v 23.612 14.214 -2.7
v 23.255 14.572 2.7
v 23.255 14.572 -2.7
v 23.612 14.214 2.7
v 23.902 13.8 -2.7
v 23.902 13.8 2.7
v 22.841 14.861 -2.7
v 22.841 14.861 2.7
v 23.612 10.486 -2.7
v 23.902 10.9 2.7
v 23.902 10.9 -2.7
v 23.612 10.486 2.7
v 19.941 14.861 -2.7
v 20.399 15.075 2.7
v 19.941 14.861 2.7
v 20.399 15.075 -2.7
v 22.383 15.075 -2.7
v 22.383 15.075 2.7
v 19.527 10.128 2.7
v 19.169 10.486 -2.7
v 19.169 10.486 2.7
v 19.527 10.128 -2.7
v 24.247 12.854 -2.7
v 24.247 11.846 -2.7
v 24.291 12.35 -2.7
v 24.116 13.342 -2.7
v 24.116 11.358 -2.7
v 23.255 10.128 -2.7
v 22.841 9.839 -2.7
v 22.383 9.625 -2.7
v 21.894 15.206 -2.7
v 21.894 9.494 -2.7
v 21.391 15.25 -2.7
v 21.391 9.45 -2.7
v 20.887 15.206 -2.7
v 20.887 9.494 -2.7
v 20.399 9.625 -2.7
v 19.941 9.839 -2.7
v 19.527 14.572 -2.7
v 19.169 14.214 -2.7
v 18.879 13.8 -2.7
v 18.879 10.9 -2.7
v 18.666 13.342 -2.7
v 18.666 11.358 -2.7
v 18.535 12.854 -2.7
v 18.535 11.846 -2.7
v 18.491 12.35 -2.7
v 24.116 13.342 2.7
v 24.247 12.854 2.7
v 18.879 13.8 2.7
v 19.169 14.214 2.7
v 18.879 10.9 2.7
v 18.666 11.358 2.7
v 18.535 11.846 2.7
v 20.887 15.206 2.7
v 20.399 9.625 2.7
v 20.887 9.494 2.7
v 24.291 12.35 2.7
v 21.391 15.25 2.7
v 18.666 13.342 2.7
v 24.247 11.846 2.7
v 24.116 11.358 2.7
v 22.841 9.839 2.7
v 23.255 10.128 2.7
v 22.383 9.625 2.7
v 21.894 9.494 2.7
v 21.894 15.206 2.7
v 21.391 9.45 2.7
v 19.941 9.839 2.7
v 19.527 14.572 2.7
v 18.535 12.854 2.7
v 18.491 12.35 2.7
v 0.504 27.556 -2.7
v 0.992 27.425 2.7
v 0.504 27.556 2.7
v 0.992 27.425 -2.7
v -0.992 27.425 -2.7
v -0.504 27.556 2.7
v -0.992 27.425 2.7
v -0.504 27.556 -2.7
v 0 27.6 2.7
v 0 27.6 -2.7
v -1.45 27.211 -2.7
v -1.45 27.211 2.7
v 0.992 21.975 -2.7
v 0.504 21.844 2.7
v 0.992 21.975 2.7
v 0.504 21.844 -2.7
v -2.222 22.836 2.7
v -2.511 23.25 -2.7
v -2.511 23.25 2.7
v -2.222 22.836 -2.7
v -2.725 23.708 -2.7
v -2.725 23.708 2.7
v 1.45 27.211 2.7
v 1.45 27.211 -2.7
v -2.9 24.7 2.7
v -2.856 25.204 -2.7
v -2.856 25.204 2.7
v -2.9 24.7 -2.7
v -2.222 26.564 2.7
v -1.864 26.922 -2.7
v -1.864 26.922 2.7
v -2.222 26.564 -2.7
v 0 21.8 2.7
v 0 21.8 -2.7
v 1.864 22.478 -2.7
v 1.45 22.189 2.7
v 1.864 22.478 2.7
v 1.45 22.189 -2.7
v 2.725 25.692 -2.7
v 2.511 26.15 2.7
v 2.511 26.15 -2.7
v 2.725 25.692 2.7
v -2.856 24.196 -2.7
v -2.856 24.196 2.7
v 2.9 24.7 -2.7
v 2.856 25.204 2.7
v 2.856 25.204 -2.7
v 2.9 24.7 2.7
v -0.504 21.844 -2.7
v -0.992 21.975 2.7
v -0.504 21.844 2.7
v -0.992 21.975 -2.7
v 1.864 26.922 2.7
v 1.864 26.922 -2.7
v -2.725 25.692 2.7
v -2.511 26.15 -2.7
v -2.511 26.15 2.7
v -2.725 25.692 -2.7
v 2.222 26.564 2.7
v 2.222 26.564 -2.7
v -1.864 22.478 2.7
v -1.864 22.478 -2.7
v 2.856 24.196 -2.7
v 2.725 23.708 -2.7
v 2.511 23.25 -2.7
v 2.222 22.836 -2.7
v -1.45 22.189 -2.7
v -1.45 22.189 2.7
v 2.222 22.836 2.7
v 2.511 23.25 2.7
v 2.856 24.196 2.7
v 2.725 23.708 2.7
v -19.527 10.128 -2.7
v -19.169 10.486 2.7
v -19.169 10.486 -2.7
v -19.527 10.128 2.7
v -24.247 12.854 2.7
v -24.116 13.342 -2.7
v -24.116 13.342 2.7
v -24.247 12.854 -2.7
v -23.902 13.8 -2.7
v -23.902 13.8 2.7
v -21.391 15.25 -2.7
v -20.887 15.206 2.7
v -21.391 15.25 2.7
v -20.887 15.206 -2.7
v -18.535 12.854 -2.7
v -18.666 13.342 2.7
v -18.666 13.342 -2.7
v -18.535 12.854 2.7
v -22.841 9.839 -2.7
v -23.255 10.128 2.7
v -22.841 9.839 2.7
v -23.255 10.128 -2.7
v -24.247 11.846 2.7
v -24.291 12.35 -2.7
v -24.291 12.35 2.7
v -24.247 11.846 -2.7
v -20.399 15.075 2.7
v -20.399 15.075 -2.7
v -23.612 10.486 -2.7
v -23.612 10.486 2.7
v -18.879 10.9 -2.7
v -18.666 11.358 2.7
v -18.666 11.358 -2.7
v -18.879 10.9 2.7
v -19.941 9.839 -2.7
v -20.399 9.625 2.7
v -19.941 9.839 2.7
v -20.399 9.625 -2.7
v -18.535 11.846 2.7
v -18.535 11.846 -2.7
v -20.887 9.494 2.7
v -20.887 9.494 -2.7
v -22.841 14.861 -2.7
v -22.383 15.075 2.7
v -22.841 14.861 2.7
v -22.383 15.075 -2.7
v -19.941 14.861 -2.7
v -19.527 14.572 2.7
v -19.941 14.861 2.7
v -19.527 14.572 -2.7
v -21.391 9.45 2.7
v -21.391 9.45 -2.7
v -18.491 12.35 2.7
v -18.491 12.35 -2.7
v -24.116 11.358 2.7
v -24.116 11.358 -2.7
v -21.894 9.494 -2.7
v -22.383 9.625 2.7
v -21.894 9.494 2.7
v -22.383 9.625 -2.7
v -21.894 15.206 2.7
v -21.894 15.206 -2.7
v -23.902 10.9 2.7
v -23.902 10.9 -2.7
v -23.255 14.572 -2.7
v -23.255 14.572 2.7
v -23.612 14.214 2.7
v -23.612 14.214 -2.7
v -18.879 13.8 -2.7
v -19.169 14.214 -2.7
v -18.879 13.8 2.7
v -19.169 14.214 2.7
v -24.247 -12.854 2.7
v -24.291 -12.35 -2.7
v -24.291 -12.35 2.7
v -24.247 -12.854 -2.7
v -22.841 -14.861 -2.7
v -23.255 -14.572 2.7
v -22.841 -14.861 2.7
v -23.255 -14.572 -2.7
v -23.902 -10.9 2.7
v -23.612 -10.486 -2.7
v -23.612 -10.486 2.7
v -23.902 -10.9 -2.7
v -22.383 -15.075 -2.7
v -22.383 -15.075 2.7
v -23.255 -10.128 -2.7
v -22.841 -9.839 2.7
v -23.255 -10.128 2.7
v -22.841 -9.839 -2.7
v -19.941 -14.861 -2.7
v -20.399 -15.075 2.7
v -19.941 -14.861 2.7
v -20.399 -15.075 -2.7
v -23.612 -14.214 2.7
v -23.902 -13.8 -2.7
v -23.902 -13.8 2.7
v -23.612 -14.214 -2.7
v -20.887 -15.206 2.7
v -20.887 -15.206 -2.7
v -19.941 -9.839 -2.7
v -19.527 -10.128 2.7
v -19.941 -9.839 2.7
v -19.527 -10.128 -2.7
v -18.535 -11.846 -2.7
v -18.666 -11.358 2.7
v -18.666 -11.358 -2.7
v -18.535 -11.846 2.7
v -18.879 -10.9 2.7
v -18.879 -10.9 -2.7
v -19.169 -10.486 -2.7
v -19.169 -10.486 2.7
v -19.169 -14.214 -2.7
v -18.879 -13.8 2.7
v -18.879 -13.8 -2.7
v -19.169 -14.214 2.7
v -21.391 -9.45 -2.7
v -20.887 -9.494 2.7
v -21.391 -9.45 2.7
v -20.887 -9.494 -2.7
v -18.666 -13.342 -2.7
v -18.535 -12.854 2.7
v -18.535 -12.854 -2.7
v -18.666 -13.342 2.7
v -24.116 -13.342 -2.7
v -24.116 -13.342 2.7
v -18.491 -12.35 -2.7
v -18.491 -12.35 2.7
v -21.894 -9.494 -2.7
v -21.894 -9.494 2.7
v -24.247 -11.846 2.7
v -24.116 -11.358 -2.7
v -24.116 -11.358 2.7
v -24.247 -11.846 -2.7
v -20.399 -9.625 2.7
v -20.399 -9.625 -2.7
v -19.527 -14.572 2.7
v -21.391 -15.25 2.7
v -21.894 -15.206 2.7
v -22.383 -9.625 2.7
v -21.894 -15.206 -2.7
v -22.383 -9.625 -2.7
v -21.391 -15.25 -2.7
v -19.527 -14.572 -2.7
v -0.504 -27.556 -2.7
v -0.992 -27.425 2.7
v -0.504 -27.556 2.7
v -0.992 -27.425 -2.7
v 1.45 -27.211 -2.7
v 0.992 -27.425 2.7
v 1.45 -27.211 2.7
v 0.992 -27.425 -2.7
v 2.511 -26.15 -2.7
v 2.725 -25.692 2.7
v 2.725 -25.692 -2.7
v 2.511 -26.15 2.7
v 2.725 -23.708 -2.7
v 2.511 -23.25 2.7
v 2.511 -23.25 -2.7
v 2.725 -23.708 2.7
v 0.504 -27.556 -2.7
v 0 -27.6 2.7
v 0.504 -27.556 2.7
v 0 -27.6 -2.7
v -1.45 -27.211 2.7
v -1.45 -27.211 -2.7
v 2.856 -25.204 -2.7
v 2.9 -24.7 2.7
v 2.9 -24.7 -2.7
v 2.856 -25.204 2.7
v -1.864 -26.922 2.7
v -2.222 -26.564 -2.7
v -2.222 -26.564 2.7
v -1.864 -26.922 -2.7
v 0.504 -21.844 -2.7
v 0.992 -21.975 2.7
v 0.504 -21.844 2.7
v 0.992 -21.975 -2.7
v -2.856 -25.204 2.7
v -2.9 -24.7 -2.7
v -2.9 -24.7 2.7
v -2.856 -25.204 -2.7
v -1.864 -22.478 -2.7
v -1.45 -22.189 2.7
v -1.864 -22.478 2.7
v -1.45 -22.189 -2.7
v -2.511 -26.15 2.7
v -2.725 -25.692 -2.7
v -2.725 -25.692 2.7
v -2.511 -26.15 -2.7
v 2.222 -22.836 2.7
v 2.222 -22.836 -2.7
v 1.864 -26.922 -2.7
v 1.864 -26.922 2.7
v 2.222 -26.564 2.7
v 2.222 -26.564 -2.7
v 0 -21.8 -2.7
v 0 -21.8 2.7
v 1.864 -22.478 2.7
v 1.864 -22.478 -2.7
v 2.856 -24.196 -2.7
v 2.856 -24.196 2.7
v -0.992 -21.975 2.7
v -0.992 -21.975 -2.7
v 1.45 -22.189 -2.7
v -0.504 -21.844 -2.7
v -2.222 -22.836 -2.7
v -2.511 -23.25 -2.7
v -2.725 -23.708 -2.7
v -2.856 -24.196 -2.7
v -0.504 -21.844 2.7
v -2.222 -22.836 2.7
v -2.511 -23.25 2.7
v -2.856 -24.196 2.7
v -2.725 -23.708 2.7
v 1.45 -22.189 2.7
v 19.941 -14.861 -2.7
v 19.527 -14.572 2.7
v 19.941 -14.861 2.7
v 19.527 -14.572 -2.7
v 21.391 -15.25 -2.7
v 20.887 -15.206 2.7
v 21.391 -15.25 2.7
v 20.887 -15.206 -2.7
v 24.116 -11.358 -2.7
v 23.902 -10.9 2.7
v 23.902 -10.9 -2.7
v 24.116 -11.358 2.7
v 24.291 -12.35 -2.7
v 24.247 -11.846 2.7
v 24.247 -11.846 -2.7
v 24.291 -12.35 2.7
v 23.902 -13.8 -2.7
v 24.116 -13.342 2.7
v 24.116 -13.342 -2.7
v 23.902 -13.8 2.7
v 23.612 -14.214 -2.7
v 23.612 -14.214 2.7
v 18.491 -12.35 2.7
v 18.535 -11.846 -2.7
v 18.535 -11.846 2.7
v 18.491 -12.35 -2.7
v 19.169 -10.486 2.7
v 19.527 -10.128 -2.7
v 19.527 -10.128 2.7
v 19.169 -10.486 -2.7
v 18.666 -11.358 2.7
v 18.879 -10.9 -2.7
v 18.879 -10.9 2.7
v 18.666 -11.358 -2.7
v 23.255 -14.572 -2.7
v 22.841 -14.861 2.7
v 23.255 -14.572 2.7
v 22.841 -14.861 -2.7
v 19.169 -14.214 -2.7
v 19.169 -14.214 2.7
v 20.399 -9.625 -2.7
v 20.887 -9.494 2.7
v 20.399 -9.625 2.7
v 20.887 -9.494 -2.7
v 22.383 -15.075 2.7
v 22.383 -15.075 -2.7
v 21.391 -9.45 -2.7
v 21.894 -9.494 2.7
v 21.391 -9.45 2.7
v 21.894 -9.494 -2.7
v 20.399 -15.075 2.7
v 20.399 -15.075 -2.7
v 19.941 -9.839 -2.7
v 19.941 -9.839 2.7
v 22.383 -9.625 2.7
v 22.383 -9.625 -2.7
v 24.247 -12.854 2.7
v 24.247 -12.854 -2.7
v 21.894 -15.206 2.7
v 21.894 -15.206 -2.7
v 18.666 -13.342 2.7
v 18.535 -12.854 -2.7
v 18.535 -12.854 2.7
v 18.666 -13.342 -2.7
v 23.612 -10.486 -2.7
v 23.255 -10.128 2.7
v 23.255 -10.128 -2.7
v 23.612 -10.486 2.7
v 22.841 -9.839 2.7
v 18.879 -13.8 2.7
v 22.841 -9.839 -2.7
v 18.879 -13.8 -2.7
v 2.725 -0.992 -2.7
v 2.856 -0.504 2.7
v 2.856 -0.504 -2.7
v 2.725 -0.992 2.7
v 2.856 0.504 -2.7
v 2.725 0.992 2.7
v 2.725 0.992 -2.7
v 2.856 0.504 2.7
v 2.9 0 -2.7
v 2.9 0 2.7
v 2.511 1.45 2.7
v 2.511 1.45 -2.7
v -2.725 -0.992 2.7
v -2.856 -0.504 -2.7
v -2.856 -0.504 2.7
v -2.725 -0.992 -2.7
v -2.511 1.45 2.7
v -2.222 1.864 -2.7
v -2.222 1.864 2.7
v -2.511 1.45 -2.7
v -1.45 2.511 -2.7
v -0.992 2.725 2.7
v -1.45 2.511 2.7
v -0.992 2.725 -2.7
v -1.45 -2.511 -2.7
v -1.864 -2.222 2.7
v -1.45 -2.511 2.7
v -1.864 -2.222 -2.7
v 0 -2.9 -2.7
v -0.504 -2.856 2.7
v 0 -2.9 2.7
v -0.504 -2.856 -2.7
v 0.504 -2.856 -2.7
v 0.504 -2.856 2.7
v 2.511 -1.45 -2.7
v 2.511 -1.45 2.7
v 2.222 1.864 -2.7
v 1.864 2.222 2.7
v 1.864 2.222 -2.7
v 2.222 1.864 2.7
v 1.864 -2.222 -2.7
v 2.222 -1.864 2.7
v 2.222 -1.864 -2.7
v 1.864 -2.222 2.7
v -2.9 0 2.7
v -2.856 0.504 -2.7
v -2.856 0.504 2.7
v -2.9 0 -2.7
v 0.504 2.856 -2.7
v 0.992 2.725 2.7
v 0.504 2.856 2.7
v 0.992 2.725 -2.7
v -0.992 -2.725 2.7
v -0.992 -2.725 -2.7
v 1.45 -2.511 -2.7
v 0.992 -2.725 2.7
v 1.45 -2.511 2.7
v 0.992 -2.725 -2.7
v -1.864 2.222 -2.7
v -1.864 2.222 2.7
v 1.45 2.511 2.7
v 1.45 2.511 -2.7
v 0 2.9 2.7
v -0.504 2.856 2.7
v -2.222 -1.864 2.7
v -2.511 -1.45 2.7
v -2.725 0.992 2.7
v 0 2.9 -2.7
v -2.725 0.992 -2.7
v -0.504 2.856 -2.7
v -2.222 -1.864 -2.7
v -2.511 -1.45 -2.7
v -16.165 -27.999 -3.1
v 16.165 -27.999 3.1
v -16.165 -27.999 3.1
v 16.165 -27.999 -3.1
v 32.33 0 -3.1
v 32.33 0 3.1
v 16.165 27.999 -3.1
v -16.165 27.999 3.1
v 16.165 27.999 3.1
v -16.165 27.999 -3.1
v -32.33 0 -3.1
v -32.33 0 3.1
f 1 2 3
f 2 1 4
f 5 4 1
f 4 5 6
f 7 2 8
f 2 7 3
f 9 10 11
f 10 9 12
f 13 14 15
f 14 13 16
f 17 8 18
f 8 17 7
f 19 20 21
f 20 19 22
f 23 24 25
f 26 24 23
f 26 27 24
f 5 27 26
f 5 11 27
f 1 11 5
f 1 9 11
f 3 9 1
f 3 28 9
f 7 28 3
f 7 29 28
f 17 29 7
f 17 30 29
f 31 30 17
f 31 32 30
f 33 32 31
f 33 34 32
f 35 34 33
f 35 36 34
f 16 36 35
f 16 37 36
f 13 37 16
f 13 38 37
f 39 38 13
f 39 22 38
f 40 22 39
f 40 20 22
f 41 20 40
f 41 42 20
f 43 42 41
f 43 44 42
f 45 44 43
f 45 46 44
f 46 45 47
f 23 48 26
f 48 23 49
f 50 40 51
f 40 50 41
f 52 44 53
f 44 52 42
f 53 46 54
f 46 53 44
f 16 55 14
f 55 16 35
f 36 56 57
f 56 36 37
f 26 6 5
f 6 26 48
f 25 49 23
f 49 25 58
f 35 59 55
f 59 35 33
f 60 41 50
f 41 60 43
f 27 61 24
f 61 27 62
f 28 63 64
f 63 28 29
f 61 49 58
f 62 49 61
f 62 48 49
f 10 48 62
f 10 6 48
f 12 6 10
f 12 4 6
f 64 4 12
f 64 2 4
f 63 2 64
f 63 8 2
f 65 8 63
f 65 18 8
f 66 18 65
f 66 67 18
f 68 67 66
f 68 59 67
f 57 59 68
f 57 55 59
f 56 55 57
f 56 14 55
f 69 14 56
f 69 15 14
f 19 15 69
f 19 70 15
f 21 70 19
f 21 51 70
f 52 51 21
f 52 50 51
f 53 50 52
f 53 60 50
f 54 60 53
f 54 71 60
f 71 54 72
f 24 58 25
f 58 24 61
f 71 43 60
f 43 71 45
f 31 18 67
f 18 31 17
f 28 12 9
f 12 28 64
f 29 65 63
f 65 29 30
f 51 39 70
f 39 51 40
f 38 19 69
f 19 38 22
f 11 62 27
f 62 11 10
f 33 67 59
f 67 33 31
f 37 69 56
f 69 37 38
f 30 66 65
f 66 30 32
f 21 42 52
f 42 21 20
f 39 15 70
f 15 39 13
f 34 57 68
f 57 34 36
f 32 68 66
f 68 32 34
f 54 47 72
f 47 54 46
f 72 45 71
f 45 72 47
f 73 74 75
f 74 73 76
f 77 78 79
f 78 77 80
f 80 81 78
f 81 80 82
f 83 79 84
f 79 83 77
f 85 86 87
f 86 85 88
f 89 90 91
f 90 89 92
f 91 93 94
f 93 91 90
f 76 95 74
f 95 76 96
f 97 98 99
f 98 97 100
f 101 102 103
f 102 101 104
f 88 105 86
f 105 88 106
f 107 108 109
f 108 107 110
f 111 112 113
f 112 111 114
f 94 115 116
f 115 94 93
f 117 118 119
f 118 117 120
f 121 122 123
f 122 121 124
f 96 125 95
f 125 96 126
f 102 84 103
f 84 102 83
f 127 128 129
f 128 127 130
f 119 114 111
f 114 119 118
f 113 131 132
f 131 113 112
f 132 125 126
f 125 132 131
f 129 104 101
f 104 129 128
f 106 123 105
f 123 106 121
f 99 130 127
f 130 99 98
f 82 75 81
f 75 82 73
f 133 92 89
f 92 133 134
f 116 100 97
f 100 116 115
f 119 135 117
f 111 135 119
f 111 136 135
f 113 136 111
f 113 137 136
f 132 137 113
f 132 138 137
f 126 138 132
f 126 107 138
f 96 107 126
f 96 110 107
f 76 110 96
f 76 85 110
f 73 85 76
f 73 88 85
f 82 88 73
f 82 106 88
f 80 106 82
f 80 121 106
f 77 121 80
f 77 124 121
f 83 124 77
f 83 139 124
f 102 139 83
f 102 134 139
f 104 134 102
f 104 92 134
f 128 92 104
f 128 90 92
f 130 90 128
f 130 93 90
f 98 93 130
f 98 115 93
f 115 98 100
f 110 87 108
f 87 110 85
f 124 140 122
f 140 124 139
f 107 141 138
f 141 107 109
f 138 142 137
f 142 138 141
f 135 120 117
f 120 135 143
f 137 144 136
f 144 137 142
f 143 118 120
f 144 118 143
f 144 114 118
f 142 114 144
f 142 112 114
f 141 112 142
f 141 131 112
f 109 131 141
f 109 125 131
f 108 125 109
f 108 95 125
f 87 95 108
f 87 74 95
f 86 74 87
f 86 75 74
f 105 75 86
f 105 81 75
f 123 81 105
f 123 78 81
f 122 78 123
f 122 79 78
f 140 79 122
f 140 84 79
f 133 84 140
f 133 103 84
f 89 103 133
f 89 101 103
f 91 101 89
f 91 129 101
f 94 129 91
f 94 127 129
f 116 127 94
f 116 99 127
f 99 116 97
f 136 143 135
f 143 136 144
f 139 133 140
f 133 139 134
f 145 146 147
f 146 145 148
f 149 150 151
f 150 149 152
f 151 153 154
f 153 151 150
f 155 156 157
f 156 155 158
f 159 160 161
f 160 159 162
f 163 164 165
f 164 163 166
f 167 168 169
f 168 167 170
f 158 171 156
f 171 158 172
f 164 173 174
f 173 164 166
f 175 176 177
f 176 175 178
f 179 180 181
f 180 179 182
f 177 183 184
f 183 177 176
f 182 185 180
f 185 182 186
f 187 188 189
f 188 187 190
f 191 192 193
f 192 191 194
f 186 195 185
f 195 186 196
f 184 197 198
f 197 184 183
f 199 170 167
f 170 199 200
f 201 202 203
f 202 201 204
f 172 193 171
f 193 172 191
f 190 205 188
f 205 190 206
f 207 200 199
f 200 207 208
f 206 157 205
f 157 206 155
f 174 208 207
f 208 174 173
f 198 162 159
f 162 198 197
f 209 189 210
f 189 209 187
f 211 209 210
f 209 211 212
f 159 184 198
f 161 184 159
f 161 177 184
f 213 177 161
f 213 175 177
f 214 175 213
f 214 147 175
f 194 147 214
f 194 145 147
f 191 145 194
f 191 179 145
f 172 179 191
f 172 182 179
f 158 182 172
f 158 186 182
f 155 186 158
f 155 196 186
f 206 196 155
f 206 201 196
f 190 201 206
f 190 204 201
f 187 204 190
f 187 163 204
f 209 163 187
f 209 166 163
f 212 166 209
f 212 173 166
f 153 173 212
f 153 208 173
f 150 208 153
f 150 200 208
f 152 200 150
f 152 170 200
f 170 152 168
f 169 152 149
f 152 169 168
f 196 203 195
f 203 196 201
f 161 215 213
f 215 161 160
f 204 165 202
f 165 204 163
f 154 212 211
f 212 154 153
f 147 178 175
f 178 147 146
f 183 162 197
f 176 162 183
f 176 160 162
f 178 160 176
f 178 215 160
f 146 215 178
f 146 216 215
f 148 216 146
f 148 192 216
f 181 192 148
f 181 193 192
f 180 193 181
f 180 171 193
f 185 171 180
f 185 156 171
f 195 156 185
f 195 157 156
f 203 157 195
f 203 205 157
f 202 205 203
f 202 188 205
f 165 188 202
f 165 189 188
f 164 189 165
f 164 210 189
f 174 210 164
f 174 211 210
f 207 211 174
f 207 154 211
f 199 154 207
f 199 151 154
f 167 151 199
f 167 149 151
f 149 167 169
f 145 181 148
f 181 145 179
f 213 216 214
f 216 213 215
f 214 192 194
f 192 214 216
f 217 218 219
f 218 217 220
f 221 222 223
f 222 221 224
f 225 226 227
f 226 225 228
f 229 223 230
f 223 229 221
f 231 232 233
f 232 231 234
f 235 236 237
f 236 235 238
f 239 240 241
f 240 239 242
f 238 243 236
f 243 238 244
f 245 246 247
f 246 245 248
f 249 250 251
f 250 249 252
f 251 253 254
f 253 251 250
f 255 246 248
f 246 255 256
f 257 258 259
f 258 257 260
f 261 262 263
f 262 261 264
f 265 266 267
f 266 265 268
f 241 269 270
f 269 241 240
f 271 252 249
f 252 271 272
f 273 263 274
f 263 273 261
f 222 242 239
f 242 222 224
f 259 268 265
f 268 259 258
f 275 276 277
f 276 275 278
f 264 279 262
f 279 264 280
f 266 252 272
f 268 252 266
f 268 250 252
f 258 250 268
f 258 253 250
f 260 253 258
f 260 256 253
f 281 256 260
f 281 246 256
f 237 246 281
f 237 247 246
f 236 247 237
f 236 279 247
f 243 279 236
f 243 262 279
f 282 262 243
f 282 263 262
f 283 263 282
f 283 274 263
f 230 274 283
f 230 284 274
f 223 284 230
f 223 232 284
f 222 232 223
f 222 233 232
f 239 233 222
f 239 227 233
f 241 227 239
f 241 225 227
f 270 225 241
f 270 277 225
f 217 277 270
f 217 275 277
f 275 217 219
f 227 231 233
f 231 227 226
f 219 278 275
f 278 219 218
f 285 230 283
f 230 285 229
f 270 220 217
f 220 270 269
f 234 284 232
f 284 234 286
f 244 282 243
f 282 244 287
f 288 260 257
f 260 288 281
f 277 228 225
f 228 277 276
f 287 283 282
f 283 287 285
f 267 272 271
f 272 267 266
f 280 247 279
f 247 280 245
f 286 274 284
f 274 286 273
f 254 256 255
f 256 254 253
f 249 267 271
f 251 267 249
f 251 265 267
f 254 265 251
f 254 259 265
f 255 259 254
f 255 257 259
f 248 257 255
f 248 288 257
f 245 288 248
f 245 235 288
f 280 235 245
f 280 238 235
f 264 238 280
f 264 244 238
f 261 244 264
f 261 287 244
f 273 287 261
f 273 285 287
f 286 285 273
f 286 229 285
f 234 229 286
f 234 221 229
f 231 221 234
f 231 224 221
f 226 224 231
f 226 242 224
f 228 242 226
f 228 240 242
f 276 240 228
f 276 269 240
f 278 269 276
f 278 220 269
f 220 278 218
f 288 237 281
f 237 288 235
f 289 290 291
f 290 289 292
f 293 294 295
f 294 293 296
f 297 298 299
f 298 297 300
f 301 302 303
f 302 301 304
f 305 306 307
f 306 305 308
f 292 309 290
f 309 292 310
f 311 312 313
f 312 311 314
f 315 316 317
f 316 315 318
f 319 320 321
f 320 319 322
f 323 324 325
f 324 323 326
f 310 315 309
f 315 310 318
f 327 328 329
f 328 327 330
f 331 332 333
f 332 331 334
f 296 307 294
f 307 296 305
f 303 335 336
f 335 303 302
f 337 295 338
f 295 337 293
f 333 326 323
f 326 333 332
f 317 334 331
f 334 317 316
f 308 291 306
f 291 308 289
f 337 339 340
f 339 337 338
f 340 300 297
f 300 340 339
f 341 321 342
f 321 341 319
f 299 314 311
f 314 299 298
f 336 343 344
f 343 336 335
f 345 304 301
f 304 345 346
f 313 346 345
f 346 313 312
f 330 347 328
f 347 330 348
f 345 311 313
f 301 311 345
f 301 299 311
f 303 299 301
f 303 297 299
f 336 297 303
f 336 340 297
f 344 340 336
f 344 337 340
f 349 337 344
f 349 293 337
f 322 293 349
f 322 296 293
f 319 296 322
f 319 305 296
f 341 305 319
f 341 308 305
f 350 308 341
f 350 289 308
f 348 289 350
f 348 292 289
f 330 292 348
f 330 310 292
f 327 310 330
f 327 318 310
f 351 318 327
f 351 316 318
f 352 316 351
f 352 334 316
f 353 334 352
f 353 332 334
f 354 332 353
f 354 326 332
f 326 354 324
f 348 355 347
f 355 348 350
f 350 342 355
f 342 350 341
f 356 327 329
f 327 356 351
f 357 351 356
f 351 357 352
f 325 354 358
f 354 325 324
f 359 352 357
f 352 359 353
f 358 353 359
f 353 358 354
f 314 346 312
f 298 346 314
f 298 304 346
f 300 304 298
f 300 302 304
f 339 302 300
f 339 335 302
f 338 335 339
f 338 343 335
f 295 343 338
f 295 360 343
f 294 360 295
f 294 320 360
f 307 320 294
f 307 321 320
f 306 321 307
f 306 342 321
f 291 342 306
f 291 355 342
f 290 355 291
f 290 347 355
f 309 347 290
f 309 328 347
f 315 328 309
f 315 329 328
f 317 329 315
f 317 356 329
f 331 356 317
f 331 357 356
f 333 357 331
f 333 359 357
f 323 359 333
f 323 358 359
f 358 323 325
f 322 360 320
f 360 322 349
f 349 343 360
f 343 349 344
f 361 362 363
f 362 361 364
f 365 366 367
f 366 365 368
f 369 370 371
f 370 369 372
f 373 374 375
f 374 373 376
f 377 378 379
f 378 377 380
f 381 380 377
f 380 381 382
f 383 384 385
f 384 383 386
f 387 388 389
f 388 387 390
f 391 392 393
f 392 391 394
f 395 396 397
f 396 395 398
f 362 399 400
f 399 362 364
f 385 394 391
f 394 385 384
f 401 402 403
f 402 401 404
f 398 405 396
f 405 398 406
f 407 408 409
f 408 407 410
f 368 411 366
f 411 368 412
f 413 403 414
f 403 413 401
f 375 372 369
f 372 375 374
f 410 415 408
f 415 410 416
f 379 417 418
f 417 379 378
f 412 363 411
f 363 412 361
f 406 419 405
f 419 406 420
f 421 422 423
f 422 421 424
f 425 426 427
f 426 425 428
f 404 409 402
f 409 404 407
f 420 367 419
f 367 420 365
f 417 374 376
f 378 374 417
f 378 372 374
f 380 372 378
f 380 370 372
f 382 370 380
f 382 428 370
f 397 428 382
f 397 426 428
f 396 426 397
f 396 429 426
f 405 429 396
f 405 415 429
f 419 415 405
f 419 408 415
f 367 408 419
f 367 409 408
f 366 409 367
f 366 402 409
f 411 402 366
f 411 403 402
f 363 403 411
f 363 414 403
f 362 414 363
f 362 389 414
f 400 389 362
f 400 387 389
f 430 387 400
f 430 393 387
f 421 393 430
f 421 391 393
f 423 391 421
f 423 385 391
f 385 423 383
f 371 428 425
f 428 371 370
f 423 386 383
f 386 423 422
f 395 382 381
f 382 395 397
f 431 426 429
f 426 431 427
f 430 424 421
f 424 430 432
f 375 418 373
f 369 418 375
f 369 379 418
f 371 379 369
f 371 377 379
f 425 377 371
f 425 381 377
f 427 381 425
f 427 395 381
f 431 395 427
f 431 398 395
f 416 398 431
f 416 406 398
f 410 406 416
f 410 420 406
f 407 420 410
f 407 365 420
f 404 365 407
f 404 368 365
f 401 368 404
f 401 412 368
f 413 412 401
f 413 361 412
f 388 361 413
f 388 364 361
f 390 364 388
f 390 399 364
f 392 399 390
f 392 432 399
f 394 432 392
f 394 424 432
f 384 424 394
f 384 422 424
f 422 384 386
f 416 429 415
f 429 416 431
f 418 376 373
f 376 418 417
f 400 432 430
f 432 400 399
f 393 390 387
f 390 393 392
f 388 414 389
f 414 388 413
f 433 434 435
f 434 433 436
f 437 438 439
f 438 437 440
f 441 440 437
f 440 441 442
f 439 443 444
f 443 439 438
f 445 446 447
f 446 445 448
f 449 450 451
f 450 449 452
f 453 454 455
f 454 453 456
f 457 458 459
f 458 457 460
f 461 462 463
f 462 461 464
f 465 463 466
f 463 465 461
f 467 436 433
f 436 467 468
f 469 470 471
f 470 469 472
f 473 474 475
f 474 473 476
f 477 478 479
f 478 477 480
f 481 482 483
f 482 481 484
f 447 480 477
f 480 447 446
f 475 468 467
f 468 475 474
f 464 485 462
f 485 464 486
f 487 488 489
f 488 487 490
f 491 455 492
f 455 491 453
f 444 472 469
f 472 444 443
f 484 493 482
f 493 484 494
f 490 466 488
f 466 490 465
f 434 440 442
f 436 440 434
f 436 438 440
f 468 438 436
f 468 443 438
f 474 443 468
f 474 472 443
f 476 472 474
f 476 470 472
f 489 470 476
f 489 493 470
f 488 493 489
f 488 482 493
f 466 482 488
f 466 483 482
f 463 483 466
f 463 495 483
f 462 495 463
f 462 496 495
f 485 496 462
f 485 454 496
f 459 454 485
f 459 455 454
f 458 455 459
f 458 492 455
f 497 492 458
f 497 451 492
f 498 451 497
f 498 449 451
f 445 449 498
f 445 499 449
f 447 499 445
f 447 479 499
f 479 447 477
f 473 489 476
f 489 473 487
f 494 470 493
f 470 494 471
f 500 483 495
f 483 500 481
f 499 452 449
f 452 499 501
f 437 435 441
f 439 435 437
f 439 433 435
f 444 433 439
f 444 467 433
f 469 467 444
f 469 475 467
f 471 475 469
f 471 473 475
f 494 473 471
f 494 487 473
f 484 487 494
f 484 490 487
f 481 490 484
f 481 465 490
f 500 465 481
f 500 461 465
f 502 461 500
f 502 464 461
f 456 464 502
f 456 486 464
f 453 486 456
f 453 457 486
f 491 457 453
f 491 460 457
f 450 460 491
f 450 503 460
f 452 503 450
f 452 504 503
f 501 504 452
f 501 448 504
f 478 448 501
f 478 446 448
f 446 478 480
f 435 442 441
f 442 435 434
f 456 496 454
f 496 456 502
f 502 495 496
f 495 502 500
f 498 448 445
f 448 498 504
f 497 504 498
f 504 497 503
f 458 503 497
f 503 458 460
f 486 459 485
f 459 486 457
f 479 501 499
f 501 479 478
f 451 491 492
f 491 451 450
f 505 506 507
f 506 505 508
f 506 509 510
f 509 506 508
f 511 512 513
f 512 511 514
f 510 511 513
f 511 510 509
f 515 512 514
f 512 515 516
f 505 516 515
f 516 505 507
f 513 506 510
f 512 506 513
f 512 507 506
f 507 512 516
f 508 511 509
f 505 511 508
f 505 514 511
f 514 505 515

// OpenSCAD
//
// commands_and_colors.scad
//

// a simple hex, with magnet ball cylinders...


//      |---|  32.33mm
//      _____
//     /     \    }       }
//    /       \   } 28mm  }
//    \       /           }
//     \     /            } 56mm
//      -----
//    |-------| 64.66mm


// unit is mm

inch = 25.4;
o2 = 0.2;
bd = 5; // ball diameter
br = bd / 2; // ball radius
bh = bd;

hr = 32.33;
hr1 = 28;
//hh = br * 2 + o2 + 3 * o2;
hh = bh + 6 * o2;
//echo("hh", hh);


module hex() {

  module balcyl() {
    cylinder(r=br + 2 * o2, h=bh + 2 * o2, center=true, $fn=36);
  }

  difference() {
    cylinder(r=hr, h=hh, center=true, $fn=6);
    union() {
      balcyl();
      for (a = [ 30 : 60 : 330 ]) {
        rotate([ 0, 0, a ])
          translate([ hr1 - br - 4 * o2, 0, 0 ])
            balcyl();
      }
    }
  }
}

hex();
